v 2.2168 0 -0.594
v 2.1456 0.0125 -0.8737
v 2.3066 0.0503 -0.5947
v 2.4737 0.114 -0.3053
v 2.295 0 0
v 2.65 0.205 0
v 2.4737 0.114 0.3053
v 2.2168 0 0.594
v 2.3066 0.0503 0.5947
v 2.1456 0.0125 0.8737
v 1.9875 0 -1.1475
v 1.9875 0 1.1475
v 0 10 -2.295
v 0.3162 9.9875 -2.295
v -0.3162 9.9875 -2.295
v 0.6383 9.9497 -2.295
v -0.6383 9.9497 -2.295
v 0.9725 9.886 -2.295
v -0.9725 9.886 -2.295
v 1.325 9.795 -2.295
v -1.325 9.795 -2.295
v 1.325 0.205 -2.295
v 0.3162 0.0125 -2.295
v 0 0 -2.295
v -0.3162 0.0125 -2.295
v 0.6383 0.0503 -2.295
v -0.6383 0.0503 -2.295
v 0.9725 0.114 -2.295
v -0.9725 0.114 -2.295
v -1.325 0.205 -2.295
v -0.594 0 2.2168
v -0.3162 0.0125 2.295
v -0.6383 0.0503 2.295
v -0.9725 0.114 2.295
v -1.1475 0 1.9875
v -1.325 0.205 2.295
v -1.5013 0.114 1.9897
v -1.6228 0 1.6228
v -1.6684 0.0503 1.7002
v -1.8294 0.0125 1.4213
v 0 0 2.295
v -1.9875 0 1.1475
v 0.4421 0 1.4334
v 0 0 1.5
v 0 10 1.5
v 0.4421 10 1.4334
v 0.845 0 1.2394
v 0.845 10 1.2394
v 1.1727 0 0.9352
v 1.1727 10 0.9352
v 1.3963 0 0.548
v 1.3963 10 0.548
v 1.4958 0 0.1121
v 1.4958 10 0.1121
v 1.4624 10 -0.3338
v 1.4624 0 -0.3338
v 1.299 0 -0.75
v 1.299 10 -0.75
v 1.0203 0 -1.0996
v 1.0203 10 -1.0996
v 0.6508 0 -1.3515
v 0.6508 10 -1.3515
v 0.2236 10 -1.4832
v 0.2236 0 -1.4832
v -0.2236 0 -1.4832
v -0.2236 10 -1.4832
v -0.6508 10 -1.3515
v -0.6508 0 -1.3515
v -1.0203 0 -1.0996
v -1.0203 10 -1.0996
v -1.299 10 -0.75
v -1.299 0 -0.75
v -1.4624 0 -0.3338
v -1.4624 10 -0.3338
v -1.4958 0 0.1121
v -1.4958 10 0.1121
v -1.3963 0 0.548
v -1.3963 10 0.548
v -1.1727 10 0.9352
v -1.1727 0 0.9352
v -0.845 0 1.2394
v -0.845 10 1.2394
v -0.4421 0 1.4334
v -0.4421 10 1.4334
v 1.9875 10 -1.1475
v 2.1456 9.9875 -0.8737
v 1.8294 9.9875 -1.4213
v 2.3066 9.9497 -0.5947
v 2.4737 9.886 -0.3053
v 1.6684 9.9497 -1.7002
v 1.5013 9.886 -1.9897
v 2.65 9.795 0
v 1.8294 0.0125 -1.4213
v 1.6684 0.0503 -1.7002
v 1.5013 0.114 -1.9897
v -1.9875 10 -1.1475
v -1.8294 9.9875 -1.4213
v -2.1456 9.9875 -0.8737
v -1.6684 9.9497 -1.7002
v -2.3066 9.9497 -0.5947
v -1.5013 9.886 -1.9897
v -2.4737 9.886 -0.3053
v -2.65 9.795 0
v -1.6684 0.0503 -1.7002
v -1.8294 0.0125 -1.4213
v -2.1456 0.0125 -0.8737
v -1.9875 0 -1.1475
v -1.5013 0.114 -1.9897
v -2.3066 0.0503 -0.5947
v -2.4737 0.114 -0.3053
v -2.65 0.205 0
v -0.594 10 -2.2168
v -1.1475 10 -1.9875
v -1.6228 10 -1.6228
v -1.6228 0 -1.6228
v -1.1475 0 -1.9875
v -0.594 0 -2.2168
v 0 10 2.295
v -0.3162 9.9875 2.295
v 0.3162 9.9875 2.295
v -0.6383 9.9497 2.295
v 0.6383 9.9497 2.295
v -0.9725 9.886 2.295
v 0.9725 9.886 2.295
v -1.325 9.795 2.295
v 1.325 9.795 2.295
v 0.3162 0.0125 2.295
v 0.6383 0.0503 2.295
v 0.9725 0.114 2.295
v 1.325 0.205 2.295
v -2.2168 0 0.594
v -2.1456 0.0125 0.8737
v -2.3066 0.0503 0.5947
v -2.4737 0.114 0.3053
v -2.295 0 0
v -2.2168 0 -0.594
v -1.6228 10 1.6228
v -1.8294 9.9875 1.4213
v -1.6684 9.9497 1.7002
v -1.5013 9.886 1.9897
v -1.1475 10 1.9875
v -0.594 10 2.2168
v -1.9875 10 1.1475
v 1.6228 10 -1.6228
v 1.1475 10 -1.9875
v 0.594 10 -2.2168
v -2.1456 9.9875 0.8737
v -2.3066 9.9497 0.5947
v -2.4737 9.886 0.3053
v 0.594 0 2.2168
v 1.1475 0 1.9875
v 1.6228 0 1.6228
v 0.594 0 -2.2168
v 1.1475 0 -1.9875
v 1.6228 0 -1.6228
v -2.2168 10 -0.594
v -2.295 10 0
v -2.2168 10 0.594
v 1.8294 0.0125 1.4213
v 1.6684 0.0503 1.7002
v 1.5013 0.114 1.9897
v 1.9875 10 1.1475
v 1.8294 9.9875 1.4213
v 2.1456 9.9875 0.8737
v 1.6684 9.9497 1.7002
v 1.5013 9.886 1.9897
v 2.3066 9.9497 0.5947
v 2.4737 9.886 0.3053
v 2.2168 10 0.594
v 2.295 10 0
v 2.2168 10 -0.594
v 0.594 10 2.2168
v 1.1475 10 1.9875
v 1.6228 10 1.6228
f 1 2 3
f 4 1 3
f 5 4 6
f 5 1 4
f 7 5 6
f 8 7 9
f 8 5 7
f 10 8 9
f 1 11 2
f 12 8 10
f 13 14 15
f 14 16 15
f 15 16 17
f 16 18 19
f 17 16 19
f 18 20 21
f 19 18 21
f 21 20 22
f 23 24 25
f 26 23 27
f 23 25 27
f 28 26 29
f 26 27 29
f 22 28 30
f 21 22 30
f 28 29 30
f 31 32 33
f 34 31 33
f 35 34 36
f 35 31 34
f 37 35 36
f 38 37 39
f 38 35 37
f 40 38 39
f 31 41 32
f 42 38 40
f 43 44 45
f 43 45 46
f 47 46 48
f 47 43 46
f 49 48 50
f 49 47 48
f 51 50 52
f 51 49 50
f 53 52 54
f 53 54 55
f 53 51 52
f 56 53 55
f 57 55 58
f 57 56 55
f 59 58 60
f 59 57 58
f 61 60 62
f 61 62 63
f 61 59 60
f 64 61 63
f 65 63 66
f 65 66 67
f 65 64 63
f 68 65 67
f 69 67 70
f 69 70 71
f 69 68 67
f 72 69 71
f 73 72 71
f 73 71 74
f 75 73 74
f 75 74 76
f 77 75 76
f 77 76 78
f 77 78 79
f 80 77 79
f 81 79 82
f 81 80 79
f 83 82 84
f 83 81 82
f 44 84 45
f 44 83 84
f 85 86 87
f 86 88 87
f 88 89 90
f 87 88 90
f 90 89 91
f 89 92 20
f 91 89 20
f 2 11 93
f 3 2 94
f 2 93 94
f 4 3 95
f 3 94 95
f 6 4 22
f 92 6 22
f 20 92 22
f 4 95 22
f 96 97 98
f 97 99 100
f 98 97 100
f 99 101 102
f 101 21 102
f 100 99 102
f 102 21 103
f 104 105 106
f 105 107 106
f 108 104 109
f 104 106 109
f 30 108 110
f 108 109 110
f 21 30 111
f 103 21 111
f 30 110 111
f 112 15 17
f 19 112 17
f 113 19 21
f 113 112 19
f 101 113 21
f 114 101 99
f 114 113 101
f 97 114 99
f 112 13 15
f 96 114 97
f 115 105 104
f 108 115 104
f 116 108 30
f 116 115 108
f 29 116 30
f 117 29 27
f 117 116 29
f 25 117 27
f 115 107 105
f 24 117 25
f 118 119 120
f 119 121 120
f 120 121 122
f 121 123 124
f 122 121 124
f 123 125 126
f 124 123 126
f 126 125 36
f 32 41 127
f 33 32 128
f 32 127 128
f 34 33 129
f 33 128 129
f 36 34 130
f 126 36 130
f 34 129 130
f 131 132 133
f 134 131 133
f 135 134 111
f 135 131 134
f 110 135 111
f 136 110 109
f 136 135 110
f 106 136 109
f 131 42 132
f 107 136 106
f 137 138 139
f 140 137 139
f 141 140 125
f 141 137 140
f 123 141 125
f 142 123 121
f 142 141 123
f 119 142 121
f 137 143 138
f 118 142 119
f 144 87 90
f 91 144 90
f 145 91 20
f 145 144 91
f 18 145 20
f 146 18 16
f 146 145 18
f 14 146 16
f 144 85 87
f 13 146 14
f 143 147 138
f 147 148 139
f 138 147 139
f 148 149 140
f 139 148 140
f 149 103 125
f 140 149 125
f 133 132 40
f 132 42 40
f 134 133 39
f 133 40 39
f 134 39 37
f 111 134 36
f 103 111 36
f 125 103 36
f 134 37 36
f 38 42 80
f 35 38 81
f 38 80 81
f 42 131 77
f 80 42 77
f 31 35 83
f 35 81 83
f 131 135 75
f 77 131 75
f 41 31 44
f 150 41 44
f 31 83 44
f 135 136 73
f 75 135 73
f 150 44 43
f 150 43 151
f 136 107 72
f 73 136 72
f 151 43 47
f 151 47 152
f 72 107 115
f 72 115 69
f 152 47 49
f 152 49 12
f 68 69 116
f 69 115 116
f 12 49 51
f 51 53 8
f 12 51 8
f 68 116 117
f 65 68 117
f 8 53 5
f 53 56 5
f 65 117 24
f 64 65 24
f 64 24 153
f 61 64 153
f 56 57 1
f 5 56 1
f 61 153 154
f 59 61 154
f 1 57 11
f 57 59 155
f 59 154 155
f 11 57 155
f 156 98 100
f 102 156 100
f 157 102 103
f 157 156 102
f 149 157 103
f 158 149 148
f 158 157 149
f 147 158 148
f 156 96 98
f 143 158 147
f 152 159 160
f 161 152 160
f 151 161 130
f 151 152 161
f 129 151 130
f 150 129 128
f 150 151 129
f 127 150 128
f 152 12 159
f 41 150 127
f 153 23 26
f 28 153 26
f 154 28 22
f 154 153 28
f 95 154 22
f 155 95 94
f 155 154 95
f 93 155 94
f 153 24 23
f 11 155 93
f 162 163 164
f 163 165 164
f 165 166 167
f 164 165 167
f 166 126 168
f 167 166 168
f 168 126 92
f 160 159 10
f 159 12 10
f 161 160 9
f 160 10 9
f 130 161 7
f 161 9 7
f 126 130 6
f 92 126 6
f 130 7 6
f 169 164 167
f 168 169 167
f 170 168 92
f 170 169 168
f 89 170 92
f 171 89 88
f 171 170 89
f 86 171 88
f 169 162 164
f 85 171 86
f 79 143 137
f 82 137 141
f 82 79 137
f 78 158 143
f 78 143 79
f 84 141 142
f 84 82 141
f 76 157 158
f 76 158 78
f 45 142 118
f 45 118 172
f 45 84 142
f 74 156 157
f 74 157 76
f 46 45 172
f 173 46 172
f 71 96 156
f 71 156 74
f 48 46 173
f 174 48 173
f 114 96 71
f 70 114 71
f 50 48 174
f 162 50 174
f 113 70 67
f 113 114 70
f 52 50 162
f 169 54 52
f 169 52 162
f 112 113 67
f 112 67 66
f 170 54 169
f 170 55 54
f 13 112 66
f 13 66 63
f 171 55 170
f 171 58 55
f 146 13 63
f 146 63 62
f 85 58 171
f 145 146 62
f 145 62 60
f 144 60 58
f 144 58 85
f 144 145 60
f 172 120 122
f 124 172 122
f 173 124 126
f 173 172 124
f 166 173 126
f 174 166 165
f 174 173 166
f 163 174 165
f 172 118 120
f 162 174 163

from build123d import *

# Parameters (mm, degrees)
SKETCH_1_R          = 1.5
EXTRUDE_1_DEPTH     = 10
SKETCH_2_OUTSIDE_W  = 49.914
SKETCH_2_OUTSIDE_H  = 49.204
SKETCH_2_OUTSIDE_R  = 2.29496732
CUT_EXTRUDE_1_DEPTH = 11.596668108
CUT_EXTRUDE_1_DRAFT = -60
SKETCH_3_OUTSIDE_W  = 49.914
SKETCH_3_OUTSIDE_H  = 49.204
SKETCH_3_OUTSIDE_R  = 2.29496732
CUT_EXTRUDE_2_DEPTH = 11.596668108
CUT_EXTRUDE_2_DRAFT = -60


with BuildPart() as part:
    # 草图1 → 凸台-拉伸1 (new body)
    with BuildSketch(Plane(origin=(0, 0, 0), x_dir=(1, 0, 0), z_dir=(0, 1, 0))):
        Polygon((1.325, 2.29496732), (-1.325, 2.29496732), (-2.65, 0), (-1.325, -2.29496732), (1.325, -2.29496732), (2.65, 0), align=None)
        Circle(SKETCH_1_R, mode=Mode.SUBTRACT)
    extrude(amount=EXTRUDE_1_DEPTH)


with BuildPart() as cut_extrude_1_tool:
    # 草图2 outside → 切除-拉伸1 (with draft: the straight prism first)
    with BuildSketch(Plane.XZ):
        Rectangle(SKETCH_2_OUTSIDE_W, SKETCH_2_OUTSIDE_H)
        Circle(SKETCH_2_OUTSIDE_R, mode=Mode.SUBTRACT)
    extrude(amount=-CUT_EXTRUDE_1_DEPTH)
    # 切除-拉伸1: the draft: its side faces are tilted about the plane it starts from
    cut_extrude_1_sides = [cut_extrude_1_tool.faces().sort_by_distance(p)[0] for p in [
        (0, 5.798334054, -24.602),
        (24.957, 5.798334054, 0),
        (0, 5.798334054, 24.602),
        (-24.957, 5.798334054, 0),
        (-2.29496732, 5.798334054, 0),
    ]]
    draft(cut_extrude_1_sides, Plane.XZ, CUT_EXTRUDE_1_DRAFT)


with BuildPart() as part_1:
    add(part.part)

    # 切除-拉伸1: cut by cut_extrude_1_tool
    add(cut_extrude_1_tool.part, mode=Mode.SUBTRACT)


with BuildPart() as cut_extrude_2_tool:
    # 草图3 outside → 切除-拉伸2 (with draft: the straight prism first)
    with BuildSketch(Plane(origin=(0, 10, 0), x_dir=(1, 0, 0), z_dir=(0, 1, 0))):
        Rectangle(SKETCH_3_OUTSIDE_W, SKETCH_3_OUTSIDE_H)
        Circle(SKETCH_3_OUTSIDE_R, mode=Mode.SUBTRACT)
    extrude(amount=-CUT_EXTRUDE_2_DEPTH)
    # 切除-拉伸2: the draft: its side faces are tilted about the plane it starts from
    cut_extrude_2_sides = [cut_extrude_2_tool.faces().sort_by_distance(p)[0] for p in [
        (0, 4.201665946, 24.602),
        (24.957, 4.201665946, 0),
        (0, 4.201665946, -24.602),
        (-24.957, 4.201665946, 0),
        (-2.29496732, 4.201665946, 0),
    ]]
    draft(cut_extrude_2_sides, Plane(origin=(0, 10, 0), x_dir=(1, 0, 0), z_dir=(0, 1, 0)), CUT_EXTRUDE_2_DRAFT)


with BuildPart() as part_2:
    add(part_1.part)

    # 切除-拉伸2: cut by cut_extrude_2_tool
    add(cut_extrude_2_tool.part, mode=Mode.SUBTRACT)


solid = part_2.part
